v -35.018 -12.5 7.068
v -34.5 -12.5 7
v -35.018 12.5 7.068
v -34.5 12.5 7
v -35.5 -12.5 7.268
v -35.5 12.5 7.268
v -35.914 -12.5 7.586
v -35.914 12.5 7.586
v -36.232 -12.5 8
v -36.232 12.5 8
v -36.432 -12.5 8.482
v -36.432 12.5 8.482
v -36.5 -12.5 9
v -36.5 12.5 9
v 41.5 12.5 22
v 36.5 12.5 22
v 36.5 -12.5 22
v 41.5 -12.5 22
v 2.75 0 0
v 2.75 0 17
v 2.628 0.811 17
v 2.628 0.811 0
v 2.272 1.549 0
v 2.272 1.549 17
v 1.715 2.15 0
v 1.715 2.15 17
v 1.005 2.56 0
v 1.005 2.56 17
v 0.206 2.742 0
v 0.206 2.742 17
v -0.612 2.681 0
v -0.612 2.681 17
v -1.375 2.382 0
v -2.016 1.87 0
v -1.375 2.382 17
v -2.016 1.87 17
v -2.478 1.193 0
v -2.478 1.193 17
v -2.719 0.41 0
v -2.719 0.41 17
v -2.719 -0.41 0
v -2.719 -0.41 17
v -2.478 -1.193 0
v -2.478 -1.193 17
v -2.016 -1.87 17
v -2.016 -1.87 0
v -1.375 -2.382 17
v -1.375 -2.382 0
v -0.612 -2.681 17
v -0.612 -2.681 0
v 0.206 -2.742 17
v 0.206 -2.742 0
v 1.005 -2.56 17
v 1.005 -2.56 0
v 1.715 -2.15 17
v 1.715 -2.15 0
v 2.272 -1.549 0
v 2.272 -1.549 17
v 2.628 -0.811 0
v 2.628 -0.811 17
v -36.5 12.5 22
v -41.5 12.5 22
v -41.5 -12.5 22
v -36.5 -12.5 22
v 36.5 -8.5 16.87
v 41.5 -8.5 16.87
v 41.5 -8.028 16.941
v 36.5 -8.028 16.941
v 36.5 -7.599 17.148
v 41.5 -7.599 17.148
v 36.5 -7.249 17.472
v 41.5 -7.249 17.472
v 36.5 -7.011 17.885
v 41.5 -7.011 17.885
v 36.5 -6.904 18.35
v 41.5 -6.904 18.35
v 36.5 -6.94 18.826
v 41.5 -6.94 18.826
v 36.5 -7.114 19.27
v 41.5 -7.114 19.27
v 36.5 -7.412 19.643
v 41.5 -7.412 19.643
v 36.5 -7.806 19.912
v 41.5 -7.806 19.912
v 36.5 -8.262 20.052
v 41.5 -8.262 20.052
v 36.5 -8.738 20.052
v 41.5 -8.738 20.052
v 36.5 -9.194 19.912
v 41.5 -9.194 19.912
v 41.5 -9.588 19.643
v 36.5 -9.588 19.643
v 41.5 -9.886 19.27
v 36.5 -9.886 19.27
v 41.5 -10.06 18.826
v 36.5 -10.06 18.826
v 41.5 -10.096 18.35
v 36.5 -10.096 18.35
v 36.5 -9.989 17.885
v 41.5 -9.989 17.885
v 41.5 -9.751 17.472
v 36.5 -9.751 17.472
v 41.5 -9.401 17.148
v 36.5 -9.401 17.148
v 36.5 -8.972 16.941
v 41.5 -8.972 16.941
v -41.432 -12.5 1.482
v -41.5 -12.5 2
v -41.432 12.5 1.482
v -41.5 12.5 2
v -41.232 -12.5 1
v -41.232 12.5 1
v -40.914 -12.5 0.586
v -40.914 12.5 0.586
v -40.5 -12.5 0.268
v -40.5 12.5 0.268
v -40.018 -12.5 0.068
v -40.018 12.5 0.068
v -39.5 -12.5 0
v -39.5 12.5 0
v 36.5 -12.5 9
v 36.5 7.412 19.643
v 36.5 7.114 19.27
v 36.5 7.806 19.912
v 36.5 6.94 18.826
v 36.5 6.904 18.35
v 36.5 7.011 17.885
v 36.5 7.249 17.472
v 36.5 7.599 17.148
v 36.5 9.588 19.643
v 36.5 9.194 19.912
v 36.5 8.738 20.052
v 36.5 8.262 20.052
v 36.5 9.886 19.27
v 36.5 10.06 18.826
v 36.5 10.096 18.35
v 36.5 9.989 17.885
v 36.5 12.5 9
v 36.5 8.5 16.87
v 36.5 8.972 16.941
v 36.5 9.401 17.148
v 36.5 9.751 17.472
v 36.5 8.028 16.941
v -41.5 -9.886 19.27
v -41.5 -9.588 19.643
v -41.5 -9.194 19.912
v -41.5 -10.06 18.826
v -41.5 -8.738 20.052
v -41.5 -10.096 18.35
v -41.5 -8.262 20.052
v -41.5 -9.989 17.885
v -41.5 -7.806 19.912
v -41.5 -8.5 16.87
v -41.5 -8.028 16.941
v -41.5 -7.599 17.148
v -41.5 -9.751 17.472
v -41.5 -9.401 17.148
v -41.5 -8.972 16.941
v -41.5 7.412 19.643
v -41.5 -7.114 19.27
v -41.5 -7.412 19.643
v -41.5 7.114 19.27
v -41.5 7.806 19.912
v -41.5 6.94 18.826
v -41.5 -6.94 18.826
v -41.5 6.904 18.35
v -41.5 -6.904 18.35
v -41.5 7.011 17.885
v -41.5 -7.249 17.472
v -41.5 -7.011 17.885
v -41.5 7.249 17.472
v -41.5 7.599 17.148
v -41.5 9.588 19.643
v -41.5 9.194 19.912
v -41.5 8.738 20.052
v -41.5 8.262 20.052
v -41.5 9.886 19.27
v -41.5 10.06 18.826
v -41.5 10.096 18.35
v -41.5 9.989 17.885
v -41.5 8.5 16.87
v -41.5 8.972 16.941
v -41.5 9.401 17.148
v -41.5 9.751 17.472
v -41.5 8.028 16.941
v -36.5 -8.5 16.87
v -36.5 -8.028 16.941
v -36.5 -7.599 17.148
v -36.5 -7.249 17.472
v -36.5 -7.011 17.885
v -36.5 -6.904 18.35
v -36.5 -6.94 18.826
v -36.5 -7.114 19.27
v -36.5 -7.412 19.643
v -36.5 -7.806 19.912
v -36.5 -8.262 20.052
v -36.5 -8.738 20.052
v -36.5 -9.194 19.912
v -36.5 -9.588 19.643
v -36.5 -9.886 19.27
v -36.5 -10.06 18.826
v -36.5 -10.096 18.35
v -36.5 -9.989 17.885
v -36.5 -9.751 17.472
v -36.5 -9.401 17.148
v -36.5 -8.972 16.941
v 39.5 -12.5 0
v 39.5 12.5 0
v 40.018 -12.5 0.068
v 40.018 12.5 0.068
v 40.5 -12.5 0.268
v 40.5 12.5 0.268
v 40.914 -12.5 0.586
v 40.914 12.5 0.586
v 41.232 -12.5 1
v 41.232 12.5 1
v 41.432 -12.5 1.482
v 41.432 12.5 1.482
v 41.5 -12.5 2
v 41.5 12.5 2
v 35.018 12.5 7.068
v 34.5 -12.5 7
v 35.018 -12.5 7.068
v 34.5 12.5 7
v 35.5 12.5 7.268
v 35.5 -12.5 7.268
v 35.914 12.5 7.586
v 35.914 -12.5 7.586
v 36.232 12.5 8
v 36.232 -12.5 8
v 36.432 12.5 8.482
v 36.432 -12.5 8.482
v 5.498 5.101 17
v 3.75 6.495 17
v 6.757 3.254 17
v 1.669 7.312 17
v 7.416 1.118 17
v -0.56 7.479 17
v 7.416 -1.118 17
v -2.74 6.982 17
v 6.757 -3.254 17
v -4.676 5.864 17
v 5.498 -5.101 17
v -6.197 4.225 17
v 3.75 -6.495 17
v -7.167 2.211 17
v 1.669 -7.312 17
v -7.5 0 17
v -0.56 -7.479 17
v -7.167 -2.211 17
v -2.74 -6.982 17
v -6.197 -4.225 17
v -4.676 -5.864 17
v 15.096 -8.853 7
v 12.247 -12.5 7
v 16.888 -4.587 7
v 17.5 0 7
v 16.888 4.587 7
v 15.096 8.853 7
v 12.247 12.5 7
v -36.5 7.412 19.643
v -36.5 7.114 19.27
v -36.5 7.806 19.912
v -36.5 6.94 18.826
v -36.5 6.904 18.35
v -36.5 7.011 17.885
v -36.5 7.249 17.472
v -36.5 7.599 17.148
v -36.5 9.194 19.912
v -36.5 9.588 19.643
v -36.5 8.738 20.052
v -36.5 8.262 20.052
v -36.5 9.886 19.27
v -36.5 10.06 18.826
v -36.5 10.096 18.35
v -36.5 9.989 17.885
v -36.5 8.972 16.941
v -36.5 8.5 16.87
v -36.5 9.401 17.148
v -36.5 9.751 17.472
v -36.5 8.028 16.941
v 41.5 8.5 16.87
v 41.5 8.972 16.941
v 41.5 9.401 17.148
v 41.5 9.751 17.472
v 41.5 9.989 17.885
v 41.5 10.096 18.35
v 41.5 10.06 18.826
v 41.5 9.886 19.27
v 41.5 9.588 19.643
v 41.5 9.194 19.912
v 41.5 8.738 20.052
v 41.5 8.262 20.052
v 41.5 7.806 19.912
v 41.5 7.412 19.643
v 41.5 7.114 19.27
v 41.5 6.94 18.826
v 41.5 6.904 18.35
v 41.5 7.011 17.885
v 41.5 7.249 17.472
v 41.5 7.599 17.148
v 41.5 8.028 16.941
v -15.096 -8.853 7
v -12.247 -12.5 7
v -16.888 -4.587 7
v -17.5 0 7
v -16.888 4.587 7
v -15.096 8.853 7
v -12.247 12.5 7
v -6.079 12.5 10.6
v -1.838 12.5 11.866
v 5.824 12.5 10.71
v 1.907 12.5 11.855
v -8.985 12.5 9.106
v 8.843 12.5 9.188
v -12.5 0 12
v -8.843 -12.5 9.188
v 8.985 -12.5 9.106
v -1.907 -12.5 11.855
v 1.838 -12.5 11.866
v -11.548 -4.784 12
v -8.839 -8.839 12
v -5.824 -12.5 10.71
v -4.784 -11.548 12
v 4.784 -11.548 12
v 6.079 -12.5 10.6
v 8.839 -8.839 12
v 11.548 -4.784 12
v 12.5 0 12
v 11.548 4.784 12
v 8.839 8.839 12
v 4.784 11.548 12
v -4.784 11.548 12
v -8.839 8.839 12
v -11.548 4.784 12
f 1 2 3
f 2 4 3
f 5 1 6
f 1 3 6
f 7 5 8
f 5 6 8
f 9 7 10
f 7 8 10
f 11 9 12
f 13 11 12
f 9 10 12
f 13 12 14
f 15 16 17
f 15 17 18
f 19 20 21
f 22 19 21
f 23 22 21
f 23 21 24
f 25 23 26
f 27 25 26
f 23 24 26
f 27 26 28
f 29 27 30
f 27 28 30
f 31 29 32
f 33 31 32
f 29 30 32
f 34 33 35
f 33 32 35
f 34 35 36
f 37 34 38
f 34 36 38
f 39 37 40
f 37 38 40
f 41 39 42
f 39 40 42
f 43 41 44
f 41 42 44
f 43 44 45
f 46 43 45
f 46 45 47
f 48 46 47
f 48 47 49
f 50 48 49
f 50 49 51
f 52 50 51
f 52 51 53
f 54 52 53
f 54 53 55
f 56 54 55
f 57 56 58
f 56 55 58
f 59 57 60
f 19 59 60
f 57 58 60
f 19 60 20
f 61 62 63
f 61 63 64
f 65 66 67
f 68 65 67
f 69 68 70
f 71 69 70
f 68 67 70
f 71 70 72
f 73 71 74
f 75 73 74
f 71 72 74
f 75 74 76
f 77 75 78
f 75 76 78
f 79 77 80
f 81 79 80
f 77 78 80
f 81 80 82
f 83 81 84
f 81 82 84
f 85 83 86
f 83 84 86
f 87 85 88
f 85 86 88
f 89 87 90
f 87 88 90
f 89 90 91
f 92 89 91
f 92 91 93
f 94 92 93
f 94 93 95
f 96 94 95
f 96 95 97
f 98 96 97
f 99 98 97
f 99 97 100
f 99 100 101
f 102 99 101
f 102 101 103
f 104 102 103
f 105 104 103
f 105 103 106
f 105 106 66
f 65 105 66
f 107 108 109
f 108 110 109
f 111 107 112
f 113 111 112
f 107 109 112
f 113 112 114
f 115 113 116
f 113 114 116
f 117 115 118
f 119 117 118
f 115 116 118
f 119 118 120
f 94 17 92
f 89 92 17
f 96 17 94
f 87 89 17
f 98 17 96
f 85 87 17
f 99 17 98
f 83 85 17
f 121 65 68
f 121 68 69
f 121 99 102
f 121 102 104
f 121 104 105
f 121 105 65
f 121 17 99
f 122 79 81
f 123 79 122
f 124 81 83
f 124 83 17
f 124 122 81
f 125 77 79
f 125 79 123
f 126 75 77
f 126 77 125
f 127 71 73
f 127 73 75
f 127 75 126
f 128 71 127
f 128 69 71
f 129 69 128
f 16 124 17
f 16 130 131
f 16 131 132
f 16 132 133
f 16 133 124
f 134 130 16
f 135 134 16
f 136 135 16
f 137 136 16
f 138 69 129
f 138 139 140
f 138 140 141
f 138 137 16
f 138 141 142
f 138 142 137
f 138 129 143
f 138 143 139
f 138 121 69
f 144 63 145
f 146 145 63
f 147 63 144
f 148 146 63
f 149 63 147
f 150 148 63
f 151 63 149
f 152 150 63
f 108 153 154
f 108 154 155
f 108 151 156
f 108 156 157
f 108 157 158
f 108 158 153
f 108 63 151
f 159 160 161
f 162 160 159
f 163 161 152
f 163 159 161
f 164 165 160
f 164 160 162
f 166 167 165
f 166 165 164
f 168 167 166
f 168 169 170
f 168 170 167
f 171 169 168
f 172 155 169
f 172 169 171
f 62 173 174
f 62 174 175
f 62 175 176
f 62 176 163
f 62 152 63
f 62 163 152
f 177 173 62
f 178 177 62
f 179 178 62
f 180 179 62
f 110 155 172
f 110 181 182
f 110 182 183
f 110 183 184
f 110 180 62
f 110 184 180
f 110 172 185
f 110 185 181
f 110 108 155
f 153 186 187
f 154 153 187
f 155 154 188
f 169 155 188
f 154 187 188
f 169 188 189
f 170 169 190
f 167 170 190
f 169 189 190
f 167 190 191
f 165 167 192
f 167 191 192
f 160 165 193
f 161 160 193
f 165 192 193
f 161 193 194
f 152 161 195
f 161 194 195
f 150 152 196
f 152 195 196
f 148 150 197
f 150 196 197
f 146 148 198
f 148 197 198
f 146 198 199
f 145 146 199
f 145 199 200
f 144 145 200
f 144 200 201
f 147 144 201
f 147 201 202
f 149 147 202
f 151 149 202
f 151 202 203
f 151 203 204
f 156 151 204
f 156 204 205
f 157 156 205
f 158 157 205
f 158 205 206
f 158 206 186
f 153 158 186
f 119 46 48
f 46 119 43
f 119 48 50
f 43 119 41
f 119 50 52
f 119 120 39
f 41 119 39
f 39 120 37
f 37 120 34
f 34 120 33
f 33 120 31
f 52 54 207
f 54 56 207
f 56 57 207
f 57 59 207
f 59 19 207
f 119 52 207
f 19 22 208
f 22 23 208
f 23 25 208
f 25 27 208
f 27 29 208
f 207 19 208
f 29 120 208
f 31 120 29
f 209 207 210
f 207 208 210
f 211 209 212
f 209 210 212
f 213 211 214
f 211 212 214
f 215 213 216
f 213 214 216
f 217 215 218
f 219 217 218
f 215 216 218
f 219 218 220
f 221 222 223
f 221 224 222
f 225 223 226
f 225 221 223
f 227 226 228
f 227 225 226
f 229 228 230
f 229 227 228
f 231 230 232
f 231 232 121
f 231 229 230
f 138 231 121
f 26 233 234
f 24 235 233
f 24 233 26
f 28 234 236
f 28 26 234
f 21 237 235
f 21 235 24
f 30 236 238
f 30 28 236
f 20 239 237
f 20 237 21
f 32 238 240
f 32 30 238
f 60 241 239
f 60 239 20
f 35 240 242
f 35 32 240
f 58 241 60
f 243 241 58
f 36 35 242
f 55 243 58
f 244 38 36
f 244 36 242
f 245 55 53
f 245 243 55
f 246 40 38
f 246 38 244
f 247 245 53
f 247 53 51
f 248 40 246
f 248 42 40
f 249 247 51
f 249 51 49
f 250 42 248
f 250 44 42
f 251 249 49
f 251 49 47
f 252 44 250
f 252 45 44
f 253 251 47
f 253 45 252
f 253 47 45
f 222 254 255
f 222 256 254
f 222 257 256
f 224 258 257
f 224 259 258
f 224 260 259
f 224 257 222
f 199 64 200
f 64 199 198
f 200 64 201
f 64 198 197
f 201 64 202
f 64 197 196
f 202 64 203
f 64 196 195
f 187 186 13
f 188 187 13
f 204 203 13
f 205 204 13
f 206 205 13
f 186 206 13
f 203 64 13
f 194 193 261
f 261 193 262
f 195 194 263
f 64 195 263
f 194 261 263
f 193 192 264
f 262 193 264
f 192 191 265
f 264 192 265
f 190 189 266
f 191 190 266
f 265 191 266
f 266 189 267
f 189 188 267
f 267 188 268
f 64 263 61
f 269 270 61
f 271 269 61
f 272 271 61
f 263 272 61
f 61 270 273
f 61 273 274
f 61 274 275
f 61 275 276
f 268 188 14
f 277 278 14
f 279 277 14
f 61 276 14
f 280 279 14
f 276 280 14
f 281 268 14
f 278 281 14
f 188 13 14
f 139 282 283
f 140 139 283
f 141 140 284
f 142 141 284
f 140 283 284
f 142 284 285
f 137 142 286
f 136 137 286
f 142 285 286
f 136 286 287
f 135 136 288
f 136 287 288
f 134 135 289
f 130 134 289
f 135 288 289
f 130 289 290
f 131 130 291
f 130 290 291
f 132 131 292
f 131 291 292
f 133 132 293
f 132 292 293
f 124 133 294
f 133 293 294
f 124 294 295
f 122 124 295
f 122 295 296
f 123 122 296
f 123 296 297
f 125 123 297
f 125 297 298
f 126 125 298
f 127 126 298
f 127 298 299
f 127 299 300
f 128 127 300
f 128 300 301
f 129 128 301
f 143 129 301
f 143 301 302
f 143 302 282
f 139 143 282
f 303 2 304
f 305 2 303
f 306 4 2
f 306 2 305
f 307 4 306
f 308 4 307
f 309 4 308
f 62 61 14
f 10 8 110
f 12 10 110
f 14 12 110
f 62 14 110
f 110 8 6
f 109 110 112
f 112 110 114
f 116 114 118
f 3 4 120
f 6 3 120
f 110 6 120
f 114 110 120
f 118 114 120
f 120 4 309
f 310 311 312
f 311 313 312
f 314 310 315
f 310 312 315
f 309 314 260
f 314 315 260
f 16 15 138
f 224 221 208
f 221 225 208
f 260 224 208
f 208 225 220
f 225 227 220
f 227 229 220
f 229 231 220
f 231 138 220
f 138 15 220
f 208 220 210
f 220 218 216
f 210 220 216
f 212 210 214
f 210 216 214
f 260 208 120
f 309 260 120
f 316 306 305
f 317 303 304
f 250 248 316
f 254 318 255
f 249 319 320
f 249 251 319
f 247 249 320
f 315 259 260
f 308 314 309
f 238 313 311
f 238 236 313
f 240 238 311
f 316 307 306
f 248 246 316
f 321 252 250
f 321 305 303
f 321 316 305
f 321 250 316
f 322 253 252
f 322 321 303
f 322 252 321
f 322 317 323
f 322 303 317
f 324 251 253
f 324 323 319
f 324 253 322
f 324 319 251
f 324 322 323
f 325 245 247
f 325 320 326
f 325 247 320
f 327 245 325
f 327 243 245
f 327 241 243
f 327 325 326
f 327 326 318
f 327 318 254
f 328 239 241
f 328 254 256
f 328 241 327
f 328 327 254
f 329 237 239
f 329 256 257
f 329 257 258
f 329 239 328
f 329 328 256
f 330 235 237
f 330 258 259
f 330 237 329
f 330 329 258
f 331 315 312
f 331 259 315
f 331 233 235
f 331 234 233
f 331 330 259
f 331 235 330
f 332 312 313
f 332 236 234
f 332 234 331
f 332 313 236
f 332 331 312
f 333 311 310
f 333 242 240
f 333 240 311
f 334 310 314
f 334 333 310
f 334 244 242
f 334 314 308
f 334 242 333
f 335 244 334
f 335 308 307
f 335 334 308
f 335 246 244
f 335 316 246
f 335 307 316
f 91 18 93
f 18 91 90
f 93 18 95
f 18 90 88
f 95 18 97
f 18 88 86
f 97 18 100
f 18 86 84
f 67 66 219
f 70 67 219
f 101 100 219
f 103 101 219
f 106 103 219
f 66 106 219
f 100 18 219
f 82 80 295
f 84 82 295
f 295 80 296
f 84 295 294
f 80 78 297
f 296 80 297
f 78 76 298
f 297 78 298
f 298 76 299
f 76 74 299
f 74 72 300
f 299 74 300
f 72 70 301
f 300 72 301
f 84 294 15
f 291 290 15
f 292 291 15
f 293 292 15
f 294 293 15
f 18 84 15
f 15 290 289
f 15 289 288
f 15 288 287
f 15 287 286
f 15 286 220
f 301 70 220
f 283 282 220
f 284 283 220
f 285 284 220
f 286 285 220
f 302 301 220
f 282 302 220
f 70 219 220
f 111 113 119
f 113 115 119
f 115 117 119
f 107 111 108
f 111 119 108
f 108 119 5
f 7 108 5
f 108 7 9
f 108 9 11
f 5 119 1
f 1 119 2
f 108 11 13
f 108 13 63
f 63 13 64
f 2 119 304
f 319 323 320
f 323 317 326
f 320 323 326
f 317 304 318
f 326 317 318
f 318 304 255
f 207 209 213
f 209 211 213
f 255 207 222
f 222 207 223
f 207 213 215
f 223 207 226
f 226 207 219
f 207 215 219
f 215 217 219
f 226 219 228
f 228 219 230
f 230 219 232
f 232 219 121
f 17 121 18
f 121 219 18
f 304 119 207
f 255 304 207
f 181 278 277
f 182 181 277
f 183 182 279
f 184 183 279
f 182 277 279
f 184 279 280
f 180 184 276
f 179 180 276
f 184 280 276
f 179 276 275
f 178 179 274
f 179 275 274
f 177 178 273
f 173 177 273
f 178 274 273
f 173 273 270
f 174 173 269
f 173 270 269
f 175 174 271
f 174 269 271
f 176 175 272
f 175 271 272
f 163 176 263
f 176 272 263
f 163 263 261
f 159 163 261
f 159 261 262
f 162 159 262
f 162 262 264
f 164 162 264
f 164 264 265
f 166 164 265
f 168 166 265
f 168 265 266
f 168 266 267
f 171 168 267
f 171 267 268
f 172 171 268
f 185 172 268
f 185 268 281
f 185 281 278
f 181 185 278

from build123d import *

# Parameters (mm, degrees)
SZKIC1_W                    = 83
SZKIC1_H                    = 25
DODANIE_WYCI_GNI_CIE1_DEPTH = 7
SZKIC2_W                    = 5
SZKIC2_H                    = 25
DODANIE_WYCI_GNI_CIE2_DEPTH = 15
WYTNIJ_WYCI_GNI_CIE1_REACH  = 88.771
SZKIC3_R                    = 1.6
SZKIC4_R                    = 7.5
DODANIE_WYCI_GNI_CIE4_DEPTH = 10
SZKIC5_R                    = 2.75
WYTNIJ_WYCI_GNI_CIE2_DEPTH  = 17
SFAZOWANIE1_SIZE            = 10
ZAOKR_GLENIE1_R             = 2
ZAOKR_GLENIE2_R             = 2


with BuildPart() as part:
    # Szkic1 → Dodanie-wyciągnięcie1 (new body)
    with BuildSketch(Plane.XY):
        Rectangle(SZKIC1_W, SZKIC1_H)
    extrude(amount=DODANIE_WYCI_GNI_CIE1_DEPTH)

    # Szkic2 → Dodanie-wyciągnięcie2 (add)
    with BuildSketch(Plane.XY.offset(7)):
        with Locations((-39, 0)):
            Rectangle(SZKIC2_W, SZKIC2_H)
        with Locations((39, 0)):
            Rectangle(SZKIC2_W, SZKIC2_H)
    extrude(amount=DODANIE_WYCI_GNI_CIE2_DEPTH)

    # Wytnij-wyciągnięcie1: up to this face of the body (flat: up to its plane)
    wytnij_wyci_gni_cie1_end = Plane(part.part.faces().sort_by_distance((-41.5, 0, 11))[0])
    # Szkic3 → Wytnij-wyciągnięcie1 (cut, up to the picked face)
    with BuildSketch(Plane(origin=(41.5, 0, 0), x_dir=(0, 0, -1), z_dir=(1, 0, 0)), mode=Mode.PRIVATE) as wytnij_wyci_gni_cie1_sk1:
        with Locations((-18.470012568, 8.5)):
            Circle(SZKIC3_R)
    wytnij_wyci_gni_cie1_tool1 = split(extrude(wytnij_wyci_gni_cie1_sk1.sketch, amount=-WYTNIJ_WYCI_GNI_CIE1_REACH, mode=Mode.PRIVATE), bisect_by=wytnij_wyci_gni_cie1_end, keep=Keep.BOTH, mode=Mode.PRIVATE)
    # Szkic3 → Wytnij-wyciągnięcie1 (cut, up to the picked face)
    with BuildSketch(Plane(origin=(41.5, 0, 0), x_dir=(0, 0, -1), z_dir=(1, 0, 0)), mode=Mode.PRIVATE) as wytnij_wyci_gni_cie1_sk2:
        with Locations((-18.470012568, -8.5)):
            Circle(SZKIC3_R)
    wytnij_wyci_gni_cie1_tool2 = split(extrude(wytnij_wyci_gni_cie1_sk2.sketch, amount=-WYTNIJ_WYCI_GNI_CIE1_REACH, mode=Mode.PRIVATE), bisect_by=wytnij_wyci_gni_cie1_end, keep=Keep.BOTH, mode=Mode.PRIVATE)
    add(wytnij_wyci_gni_cie1_tool1.solids().sort_by(Axis((41.5, 8.5, 18.470013), (-1, 0, 0)))[0], mode=Mode.SUBTRACT)
    add(wytnij_wyci_gni_cie1_tool2.solids().sort_by(Axis((41.5, -8.5, 18.470013), (-1, 0, 0)))[0], mode=Mode.SUBTRACT)

    # Szkic4 → Dodanie-wyciągnięcie4 (add)
    with BuildSketch(Plane.XY.offset(7)):
        with Locations(Location((0, 0, 0), (0, 0, 180))):
            Circle(SZKIC4_R)
    extrude(amount=DODANIE_WYCI_GNI_CIE4_DEPTH)

    # Szkic5 → Wytnij-wyciągnięcie2 (cut)
    with BuildSketch(Plane.XY.offset(17)):
        Circle(SZKIC5_R)
    extrude(amount=-WYTNIJ_WYCI_GNI_CIE2_DEPTH, mode=Mode.SUBTRACT)

    # Sfazowanie1
    # the kernel refuses this chamfer: 10 mm, written as the material it adds along each edge
    with BuildSketch(Plane(origin=(0, 0, 7), x_dir=(-1, 0, 0), z_dir=(0, 1, 0))) as sfazowanie1_piece_1_section:
        Polygon((7.5 + SFAZOWANIE1_SIZE, 0), (7.5, SFAZOWANIE1_SIZE), (7.5, 0), align=None)
    sfazowanie1_piece_1 = revolve(axis=Axis((0, 0, 7), (0, 0, 1)), mode=Mode.PRIVATE)
    sfazowanie1_piece_1 = split(sfazowanie1_piece_1, bisect_by=Plane(origin=(12.53571583, 12.5, 11.752873117), z_dir=(0, -1, 0)), keep=Keep.TOP, mode=Mode.PRIVATE)
    sfazowanie1_piece_1 = split(sfazowanie1_piece_1, bisect_by=Plane(origin=(12.53571583, -12.5, 11.752873117), z_dir=(0, 1, 0)), keep=Keep.TOP, mode=Mode.PRIVATE)
    sfazowanie1_piece_1 = split(sfazowanie1_piece_1, bisect_by=Plane(origin=(12.53571583, 0, 17), z_dir=(0, 0, -1)), keep=Keep.TOP, mode=Mode.PRIVATE)
    add(sfazowanie1_piece_1)

    # Zaokrąglenie1
    zaokr_glenie1_edges = [part.edges().sort_by_distance(p)[0] for p in [
        (-36.5, 0, 7),
        (36.5, 0, 7),
    ]]
    fillet(zaokr_glenie1_edges, radius=ZAOKR_GLENIE1_R)

    # Zaokrąglenie2
    zaokr_glenie2_edges = [part.edges().sort_by_distance(p)[0] for p in [
        (41.5, 0, 0),
        (-41.5, 0, 0),
    ]]
    fillet(zaokr_glenie2_edges, radius=ZAOKR_GLENIE2_R)


solid = part.part
